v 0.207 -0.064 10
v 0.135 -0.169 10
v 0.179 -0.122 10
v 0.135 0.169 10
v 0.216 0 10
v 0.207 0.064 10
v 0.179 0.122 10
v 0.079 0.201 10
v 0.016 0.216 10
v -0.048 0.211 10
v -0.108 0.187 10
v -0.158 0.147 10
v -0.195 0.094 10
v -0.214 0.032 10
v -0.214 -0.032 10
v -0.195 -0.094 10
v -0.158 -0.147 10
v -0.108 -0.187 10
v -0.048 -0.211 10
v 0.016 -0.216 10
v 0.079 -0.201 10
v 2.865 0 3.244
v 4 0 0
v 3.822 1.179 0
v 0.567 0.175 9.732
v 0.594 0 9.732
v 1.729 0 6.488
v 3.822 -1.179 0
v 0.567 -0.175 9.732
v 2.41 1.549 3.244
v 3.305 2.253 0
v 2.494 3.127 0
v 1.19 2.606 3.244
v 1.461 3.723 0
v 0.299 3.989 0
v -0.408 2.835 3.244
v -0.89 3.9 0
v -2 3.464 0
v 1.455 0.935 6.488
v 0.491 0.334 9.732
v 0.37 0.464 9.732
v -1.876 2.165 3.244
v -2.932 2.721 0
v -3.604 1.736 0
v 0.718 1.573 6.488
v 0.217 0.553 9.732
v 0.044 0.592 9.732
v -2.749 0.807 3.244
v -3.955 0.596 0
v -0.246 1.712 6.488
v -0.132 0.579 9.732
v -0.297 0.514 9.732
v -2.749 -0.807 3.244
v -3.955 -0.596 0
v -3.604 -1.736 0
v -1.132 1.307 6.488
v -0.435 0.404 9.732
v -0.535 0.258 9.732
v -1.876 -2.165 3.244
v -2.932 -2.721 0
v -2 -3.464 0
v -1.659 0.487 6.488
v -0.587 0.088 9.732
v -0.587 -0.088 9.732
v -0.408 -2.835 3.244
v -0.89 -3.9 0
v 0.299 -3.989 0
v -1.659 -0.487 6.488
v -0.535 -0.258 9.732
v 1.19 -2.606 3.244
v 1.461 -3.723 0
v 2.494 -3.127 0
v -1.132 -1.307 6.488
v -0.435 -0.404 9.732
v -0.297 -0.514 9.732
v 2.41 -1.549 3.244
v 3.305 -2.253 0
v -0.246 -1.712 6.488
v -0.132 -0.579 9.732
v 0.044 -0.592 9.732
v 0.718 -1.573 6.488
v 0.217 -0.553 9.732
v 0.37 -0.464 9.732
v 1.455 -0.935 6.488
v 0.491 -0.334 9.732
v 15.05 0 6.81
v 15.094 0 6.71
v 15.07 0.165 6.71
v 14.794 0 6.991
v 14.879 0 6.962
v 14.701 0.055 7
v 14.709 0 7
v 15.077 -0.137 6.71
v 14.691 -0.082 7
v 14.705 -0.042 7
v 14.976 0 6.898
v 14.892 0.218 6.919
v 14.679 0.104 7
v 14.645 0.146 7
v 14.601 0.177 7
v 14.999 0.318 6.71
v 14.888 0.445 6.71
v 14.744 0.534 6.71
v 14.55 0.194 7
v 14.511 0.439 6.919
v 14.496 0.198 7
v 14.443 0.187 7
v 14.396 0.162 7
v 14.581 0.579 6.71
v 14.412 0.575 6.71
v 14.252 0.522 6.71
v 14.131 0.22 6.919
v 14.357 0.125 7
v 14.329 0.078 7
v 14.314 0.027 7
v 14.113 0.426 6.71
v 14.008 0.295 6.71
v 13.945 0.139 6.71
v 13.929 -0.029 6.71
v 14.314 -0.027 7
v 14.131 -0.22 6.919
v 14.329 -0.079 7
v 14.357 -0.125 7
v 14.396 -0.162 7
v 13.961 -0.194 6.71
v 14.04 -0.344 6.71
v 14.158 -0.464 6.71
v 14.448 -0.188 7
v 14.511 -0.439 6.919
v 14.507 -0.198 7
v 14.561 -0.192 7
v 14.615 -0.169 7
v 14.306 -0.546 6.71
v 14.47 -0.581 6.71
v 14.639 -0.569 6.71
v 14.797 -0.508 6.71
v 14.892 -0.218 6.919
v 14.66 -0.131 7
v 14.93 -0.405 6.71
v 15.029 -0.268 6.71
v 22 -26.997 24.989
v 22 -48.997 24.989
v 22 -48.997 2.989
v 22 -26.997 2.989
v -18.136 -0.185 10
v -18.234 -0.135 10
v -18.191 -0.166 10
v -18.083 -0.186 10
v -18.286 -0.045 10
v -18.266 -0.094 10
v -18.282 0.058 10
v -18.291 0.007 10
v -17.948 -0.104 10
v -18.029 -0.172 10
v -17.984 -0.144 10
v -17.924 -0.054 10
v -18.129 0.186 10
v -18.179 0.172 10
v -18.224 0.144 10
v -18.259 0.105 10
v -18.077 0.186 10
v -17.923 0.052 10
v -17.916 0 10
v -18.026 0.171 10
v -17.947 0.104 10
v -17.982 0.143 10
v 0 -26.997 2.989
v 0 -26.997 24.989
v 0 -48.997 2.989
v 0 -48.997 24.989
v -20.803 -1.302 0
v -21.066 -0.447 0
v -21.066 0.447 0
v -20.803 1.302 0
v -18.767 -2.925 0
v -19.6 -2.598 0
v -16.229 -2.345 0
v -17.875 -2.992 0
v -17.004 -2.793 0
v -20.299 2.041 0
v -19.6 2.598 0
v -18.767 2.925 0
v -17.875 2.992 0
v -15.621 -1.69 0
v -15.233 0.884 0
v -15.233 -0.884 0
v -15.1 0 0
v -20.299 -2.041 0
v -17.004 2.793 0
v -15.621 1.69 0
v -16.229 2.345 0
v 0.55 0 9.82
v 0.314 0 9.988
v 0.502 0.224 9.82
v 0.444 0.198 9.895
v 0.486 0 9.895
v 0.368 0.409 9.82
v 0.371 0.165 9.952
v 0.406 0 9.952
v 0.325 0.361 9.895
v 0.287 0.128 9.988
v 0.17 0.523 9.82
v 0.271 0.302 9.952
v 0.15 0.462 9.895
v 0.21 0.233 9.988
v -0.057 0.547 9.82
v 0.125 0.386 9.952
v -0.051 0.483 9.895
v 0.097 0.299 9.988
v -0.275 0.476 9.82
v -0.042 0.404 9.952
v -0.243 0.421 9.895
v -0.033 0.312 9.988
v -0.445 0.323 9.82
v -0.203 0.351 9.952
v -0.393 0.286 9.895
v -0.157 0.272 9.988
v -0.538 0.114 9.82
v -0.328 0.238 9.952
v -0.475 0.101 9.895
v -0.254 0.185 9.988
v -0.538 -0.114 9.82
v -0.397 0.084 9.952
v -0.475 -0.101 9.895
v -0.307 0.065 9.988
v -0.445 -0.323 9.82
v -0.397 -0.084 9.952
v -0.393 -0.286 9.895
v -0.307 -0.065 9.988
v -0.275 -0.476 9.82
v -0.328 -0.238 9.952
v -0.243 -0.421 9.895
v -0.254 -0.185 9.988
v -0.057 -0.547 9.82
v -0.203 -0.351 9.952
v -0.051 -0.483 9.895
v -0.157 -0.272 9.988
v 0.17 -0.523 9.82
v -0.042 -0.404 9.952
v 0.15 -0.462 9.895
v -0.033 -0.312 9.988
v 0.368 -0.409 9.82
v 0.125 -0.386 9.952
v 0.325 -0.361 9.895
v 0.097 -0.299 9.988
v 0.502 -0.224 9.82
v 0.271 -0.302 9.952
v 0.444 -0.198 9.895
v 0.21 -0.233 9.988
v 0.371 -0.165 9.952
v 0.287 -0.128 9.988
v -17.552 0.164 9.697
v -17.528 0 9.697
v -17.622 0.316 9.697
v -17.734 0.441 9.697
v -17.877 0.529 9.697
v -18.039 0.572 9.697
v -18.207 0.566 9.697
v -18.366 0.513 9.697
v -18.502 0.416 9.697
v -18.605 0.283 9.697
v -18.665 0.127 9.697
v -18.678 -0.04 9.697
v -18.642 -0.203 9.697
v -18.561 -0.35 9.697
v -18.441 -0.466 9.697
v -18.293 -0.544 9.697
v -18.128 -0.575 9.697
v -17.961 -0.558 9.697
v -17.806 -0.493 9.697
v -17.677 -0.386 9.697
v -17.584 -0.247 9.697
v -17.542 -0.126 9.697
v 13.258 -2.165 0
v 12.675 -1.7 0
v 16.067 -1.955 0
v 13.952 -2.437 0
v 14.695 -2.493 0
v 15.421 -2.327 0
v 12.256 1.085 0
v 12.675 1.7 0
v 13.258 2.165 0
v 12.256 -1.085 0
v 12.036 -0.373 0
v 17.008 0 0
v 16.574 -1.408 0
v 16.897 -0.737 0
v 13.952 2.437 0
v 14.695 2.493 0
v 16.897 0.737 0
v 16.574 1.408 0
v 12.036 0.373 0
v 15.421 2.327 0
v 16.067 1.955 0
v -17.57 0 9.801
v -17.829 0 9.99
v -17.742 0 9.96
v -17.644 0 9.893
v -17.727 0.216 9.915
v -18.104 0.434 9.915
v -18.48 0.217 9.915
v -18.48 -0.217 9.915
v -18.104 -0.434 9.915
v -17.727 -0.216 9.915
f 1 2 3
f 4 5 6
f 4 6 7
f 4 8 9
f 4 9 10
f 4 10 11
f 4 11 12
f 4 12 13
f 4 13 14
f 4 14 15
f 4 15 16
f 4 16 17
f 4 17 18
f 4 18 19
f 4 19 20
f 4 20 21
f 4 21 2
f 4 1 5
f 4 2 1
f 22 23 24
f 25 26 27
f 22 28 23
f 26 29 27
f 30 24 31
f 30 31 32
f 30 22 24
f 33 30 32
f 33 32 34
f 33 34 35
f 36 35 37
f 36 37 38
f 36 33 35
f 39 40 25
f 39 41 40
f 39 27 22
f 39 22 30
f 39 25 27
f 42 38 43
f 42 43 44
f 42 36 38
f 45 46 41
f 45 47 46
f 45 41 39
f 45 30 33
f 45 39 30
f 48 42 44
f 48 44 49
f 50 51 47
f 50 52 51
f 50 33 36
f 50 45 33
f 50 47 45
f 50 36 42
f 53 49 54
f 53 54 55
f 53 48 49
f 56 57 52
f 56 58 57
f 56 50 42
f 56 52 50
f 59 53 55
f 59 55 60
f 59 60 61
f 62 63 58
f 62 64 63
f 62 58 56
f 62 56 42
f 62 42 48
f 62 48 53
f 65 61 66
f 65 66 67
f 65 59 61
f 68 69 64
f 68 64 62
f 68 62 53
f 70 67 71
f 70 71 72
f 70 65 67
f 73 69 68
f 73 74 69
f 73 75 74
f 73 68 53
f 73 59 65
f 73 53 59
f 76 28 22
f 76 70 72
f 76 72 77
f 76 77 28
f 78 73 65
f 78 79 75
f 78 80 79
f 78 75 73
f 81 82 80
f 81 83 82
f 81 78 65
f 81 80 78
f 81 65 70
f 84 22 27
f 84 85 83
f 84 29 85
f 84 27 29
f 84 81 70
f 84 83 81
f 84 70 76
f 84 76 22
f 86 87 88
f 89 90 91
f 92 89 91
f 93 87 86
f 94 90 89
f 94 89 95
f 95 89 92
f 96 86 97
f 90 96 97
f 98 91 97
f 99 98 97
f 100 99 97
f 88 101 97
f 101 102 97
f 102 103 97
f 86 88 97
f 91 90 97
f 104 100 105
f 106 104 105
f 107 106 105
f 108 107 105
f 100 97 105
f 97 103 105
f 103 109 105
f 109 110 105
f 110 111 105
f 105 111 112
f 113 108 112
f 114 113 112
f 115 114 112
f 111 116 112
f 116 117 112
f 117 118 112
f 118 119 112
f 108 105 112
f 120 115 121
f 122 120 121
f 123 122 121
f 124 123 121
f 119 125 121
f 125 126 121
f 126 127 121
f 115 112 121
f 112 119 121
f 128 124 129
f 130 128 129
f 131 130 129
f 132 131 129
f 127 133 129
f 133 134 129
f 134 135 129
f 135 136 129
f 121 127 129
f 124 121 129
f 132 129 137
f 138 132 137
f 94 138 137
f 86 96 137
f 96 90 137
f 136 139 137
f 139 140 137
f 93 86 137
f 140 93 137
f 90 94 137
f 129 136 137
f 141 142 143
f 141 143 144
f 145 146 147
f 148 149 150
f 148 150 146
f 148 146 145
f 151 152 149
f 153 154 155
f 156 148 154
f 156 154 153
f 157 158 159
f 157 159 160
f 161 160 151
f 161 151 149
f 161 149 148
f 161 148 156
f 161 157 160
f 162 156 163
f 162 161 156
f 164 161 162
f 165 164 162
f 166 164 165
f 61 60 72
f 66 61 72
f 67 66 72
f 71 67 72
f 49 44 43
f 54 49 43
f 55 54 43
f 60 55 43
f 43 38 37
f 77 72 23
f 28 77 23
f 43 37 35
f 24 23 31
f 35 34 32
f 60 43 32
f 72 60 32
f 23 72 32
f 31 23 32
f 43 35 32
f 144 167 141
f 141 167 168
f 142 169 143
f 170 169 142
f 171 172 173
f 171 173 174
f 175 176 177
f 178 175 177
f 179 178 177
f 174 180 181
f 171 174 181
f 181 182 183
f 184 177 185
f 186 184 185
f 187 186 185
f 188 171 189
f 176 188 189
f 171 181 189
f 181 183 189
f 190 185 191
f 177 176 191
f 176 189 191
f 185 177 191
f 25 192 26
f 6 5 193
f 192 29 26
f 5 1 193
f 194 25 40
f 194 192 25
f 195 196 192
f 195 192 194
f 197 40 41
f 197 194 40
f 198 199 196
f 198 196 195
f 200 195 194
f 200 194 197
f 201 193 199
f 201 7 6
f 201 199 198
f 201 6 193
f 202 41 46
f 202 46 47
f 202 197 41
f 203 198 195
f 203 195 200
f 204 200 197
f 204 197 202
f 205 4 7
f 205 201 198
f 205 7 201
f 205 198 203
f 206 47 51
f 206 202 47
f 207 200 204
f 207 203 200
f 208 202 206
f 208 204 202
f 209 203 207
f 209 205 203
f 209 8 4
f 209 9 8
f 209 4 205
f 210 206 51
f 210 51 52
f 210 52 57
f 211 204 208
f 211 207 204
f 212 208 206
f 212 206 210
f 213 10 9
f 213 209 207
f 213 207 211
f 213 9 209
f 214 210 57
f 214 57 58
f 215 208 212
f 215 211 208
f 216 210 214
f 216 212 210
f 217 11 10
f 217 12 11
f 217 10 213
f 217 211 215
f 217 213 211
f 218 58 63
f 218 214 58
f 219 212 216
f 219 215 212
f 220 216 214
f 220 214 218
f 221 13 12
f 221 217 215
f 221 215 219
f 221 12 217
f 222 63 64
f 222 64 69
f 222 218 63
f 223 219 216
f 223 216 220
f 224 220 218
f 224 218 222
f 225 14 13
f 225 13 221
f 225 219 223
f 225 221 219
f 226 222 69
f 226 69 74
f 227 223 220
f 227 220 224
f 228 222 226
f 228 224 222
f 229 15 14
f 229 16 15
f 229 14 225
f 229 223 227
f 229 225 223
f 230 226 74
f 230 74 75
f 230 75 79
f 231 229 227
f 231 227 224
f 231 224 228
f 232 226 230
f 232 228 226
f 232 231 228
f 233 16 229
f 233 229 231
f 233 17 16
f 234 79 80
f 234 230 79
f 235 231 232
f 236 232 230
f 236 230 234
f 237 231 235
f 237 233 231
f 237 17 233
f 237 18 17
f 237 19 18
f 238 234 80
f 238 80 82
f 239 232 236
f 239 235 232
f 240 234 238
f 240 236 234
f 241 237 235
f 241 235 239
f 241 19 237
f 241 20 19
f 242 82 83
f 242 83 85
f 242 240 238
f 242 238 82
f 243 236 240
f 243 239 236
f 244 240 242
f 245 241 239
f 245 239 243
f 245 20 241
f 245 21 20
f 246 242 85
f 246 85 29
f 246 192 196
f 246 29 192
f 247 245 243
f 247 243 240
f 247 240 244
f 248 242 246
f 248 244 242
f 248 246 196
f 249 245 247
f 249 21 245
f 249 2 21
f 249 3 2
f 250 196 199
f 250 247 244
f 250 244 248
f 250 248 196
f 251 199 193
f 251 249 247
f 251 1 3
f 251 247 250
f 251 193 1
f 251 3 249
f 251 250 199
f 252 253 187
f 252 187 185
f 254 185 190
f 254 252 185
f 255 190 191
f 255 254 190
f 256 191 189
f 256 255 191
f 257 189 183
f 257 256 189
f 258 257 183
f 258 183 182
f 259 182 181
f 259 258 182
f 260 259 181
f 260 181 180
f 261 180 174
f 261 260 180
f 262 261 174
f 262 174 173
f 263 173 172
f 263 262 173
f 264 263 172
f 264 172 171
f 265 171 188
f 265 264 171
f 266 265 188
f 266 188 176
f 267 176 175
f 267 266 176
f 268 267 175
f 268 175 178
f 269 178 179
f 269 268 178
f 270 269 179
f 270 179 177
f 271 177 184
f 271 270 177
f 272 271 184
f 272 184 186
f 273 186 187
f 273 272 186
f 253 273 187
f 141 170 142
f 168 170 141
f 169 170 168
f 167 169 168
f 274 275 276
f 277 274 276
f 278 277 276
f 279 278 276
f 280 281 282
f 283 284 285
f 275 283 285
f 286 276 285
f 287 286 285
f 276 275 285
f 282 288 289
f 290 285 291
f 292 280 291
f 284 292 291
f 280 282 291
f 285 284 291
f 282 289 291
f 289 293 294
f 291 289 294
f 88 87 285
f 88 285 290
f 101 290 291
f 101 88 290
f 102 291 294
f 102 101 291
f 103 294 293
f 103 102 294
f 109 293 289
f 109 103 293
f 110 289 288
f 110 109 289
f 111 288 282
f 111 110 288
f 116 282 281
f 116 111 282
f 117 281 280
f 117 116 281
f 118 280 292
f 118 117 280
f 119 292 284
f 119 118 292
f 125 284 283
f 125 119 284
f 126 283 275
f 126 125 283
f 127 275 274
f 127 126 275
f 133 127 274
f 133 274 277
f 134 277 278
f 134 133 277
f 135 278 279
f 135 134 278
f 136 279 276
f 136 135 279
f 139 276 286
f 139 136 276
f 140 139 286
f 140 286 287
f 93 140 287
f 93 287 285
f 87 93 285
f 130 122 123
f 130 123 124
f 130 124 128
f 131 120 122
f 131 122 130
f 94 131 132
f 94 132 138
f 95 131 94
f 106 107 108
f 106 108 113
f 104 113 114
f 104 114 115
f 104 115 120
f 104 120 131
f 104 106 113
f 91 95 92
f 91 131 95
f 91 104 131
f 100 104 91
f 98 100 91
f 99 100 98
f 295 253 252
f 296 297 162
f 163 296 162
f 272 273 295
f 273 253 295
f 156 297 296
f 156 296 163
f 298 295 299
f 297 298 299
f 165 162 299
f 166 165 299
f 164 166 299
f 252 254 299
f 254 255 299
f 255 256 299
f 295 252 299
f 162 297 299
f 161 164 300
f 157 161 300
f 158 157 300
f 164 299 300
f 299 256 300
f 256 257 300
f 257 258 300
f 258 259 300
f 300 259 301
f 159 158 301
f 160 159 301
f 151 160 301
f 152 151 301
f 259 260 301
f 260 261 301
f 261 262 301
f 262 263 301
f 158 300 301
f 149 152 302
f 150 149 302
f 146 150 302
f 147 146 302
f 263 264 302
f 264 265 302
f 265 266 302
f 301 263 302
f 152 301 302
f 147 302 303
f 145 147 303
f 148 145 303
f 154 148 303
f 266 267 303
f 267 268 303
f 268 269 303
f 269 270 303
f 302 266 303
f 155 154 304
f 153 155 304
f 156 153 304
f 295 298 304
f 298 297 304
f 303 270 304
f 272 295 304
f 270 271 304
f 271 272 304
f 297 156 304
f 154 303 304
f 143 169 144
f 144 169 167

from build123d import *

# Parameters (mm, degrees)
F0_R      = 4
F4_R      = 0.5
F0_R_2    = 3
F0_R_3    = 2.5
F3_R      = 0.5
F8_R      = 0.4
F8_2_R    = 0.4
F8_3_R    = 0.4
F9_W      = 22
F9_H      = 22
F10_DEPTH = 22


with BuildPart() as f5:
    # F0 (on Top) → F5 section 0
    with BuildSketch(Plane.XY):
        Circle(F0_R)
    # F4 (on offset) → F5 section 1
    with BuildSketch(Plane.XY.offset(10)):
        Circle(F4_R)
    loft()

    # F8
    f8_edges = [f5.edges().sort_by_distance(p)[0] for p in [
        (-0.5, 0, 10),
    ]]
    fillet(f8_edges, radius=F8_R)


with BuildPart() as f6:
    # F0 (on Top) → F6 section 0
    with BuildSketch(Plane.XY):
        with Locations((-18.0996377021, 0)):
            Circle(F0_R_2)
    # F4 (on offset) → F6 section 1
    with BuildSketch(Plane.XY.offset(10)):
        with Locations((-18.1038286537, 0)):
            Circle(F4_R)
    loft()

    # F8#2
    f8_2_edges = [f6.edges().sort_by_distance(p)[0] for p in [
        (-18.603829, 0, 10),
    ]]
    fillet(f8_2_edges, radius=F8_2_R)


with BuildPart() as f7:
    # F0 (on Top) → F7 section 0
    with BuildSketch(Plane.XY):
        with Locations((14.5079502836, 0)):
            Circle(F0_R_3)
    # F3 (on offset) → F7 section 1
    with BuildSketch(Plane.XY.offset(7)):
        with Locations((14.510884881, 0)):
            Circle(F3_R)
    loft()

    # F8#3
    f8_3_edges = [f7.edges().sort_by_distance(p)[0] for p in [
        (14.010885, 0, 7),
    ]]
    fillet(f8_3_edges, radius=F8_3_R)


with BuildPart() as f10:
    # F9 (on Right) → F10 (new body)
    with BuildSketch(Plane.YZ):
        with Locations((-37.9973315299, 13.9893240426)):
            Rectangle(F9_W, F9_H)
    extrude(amount=F10_DEPTH)


solid = Compound([f5.part, f6.part, f7.part, f10.part])
